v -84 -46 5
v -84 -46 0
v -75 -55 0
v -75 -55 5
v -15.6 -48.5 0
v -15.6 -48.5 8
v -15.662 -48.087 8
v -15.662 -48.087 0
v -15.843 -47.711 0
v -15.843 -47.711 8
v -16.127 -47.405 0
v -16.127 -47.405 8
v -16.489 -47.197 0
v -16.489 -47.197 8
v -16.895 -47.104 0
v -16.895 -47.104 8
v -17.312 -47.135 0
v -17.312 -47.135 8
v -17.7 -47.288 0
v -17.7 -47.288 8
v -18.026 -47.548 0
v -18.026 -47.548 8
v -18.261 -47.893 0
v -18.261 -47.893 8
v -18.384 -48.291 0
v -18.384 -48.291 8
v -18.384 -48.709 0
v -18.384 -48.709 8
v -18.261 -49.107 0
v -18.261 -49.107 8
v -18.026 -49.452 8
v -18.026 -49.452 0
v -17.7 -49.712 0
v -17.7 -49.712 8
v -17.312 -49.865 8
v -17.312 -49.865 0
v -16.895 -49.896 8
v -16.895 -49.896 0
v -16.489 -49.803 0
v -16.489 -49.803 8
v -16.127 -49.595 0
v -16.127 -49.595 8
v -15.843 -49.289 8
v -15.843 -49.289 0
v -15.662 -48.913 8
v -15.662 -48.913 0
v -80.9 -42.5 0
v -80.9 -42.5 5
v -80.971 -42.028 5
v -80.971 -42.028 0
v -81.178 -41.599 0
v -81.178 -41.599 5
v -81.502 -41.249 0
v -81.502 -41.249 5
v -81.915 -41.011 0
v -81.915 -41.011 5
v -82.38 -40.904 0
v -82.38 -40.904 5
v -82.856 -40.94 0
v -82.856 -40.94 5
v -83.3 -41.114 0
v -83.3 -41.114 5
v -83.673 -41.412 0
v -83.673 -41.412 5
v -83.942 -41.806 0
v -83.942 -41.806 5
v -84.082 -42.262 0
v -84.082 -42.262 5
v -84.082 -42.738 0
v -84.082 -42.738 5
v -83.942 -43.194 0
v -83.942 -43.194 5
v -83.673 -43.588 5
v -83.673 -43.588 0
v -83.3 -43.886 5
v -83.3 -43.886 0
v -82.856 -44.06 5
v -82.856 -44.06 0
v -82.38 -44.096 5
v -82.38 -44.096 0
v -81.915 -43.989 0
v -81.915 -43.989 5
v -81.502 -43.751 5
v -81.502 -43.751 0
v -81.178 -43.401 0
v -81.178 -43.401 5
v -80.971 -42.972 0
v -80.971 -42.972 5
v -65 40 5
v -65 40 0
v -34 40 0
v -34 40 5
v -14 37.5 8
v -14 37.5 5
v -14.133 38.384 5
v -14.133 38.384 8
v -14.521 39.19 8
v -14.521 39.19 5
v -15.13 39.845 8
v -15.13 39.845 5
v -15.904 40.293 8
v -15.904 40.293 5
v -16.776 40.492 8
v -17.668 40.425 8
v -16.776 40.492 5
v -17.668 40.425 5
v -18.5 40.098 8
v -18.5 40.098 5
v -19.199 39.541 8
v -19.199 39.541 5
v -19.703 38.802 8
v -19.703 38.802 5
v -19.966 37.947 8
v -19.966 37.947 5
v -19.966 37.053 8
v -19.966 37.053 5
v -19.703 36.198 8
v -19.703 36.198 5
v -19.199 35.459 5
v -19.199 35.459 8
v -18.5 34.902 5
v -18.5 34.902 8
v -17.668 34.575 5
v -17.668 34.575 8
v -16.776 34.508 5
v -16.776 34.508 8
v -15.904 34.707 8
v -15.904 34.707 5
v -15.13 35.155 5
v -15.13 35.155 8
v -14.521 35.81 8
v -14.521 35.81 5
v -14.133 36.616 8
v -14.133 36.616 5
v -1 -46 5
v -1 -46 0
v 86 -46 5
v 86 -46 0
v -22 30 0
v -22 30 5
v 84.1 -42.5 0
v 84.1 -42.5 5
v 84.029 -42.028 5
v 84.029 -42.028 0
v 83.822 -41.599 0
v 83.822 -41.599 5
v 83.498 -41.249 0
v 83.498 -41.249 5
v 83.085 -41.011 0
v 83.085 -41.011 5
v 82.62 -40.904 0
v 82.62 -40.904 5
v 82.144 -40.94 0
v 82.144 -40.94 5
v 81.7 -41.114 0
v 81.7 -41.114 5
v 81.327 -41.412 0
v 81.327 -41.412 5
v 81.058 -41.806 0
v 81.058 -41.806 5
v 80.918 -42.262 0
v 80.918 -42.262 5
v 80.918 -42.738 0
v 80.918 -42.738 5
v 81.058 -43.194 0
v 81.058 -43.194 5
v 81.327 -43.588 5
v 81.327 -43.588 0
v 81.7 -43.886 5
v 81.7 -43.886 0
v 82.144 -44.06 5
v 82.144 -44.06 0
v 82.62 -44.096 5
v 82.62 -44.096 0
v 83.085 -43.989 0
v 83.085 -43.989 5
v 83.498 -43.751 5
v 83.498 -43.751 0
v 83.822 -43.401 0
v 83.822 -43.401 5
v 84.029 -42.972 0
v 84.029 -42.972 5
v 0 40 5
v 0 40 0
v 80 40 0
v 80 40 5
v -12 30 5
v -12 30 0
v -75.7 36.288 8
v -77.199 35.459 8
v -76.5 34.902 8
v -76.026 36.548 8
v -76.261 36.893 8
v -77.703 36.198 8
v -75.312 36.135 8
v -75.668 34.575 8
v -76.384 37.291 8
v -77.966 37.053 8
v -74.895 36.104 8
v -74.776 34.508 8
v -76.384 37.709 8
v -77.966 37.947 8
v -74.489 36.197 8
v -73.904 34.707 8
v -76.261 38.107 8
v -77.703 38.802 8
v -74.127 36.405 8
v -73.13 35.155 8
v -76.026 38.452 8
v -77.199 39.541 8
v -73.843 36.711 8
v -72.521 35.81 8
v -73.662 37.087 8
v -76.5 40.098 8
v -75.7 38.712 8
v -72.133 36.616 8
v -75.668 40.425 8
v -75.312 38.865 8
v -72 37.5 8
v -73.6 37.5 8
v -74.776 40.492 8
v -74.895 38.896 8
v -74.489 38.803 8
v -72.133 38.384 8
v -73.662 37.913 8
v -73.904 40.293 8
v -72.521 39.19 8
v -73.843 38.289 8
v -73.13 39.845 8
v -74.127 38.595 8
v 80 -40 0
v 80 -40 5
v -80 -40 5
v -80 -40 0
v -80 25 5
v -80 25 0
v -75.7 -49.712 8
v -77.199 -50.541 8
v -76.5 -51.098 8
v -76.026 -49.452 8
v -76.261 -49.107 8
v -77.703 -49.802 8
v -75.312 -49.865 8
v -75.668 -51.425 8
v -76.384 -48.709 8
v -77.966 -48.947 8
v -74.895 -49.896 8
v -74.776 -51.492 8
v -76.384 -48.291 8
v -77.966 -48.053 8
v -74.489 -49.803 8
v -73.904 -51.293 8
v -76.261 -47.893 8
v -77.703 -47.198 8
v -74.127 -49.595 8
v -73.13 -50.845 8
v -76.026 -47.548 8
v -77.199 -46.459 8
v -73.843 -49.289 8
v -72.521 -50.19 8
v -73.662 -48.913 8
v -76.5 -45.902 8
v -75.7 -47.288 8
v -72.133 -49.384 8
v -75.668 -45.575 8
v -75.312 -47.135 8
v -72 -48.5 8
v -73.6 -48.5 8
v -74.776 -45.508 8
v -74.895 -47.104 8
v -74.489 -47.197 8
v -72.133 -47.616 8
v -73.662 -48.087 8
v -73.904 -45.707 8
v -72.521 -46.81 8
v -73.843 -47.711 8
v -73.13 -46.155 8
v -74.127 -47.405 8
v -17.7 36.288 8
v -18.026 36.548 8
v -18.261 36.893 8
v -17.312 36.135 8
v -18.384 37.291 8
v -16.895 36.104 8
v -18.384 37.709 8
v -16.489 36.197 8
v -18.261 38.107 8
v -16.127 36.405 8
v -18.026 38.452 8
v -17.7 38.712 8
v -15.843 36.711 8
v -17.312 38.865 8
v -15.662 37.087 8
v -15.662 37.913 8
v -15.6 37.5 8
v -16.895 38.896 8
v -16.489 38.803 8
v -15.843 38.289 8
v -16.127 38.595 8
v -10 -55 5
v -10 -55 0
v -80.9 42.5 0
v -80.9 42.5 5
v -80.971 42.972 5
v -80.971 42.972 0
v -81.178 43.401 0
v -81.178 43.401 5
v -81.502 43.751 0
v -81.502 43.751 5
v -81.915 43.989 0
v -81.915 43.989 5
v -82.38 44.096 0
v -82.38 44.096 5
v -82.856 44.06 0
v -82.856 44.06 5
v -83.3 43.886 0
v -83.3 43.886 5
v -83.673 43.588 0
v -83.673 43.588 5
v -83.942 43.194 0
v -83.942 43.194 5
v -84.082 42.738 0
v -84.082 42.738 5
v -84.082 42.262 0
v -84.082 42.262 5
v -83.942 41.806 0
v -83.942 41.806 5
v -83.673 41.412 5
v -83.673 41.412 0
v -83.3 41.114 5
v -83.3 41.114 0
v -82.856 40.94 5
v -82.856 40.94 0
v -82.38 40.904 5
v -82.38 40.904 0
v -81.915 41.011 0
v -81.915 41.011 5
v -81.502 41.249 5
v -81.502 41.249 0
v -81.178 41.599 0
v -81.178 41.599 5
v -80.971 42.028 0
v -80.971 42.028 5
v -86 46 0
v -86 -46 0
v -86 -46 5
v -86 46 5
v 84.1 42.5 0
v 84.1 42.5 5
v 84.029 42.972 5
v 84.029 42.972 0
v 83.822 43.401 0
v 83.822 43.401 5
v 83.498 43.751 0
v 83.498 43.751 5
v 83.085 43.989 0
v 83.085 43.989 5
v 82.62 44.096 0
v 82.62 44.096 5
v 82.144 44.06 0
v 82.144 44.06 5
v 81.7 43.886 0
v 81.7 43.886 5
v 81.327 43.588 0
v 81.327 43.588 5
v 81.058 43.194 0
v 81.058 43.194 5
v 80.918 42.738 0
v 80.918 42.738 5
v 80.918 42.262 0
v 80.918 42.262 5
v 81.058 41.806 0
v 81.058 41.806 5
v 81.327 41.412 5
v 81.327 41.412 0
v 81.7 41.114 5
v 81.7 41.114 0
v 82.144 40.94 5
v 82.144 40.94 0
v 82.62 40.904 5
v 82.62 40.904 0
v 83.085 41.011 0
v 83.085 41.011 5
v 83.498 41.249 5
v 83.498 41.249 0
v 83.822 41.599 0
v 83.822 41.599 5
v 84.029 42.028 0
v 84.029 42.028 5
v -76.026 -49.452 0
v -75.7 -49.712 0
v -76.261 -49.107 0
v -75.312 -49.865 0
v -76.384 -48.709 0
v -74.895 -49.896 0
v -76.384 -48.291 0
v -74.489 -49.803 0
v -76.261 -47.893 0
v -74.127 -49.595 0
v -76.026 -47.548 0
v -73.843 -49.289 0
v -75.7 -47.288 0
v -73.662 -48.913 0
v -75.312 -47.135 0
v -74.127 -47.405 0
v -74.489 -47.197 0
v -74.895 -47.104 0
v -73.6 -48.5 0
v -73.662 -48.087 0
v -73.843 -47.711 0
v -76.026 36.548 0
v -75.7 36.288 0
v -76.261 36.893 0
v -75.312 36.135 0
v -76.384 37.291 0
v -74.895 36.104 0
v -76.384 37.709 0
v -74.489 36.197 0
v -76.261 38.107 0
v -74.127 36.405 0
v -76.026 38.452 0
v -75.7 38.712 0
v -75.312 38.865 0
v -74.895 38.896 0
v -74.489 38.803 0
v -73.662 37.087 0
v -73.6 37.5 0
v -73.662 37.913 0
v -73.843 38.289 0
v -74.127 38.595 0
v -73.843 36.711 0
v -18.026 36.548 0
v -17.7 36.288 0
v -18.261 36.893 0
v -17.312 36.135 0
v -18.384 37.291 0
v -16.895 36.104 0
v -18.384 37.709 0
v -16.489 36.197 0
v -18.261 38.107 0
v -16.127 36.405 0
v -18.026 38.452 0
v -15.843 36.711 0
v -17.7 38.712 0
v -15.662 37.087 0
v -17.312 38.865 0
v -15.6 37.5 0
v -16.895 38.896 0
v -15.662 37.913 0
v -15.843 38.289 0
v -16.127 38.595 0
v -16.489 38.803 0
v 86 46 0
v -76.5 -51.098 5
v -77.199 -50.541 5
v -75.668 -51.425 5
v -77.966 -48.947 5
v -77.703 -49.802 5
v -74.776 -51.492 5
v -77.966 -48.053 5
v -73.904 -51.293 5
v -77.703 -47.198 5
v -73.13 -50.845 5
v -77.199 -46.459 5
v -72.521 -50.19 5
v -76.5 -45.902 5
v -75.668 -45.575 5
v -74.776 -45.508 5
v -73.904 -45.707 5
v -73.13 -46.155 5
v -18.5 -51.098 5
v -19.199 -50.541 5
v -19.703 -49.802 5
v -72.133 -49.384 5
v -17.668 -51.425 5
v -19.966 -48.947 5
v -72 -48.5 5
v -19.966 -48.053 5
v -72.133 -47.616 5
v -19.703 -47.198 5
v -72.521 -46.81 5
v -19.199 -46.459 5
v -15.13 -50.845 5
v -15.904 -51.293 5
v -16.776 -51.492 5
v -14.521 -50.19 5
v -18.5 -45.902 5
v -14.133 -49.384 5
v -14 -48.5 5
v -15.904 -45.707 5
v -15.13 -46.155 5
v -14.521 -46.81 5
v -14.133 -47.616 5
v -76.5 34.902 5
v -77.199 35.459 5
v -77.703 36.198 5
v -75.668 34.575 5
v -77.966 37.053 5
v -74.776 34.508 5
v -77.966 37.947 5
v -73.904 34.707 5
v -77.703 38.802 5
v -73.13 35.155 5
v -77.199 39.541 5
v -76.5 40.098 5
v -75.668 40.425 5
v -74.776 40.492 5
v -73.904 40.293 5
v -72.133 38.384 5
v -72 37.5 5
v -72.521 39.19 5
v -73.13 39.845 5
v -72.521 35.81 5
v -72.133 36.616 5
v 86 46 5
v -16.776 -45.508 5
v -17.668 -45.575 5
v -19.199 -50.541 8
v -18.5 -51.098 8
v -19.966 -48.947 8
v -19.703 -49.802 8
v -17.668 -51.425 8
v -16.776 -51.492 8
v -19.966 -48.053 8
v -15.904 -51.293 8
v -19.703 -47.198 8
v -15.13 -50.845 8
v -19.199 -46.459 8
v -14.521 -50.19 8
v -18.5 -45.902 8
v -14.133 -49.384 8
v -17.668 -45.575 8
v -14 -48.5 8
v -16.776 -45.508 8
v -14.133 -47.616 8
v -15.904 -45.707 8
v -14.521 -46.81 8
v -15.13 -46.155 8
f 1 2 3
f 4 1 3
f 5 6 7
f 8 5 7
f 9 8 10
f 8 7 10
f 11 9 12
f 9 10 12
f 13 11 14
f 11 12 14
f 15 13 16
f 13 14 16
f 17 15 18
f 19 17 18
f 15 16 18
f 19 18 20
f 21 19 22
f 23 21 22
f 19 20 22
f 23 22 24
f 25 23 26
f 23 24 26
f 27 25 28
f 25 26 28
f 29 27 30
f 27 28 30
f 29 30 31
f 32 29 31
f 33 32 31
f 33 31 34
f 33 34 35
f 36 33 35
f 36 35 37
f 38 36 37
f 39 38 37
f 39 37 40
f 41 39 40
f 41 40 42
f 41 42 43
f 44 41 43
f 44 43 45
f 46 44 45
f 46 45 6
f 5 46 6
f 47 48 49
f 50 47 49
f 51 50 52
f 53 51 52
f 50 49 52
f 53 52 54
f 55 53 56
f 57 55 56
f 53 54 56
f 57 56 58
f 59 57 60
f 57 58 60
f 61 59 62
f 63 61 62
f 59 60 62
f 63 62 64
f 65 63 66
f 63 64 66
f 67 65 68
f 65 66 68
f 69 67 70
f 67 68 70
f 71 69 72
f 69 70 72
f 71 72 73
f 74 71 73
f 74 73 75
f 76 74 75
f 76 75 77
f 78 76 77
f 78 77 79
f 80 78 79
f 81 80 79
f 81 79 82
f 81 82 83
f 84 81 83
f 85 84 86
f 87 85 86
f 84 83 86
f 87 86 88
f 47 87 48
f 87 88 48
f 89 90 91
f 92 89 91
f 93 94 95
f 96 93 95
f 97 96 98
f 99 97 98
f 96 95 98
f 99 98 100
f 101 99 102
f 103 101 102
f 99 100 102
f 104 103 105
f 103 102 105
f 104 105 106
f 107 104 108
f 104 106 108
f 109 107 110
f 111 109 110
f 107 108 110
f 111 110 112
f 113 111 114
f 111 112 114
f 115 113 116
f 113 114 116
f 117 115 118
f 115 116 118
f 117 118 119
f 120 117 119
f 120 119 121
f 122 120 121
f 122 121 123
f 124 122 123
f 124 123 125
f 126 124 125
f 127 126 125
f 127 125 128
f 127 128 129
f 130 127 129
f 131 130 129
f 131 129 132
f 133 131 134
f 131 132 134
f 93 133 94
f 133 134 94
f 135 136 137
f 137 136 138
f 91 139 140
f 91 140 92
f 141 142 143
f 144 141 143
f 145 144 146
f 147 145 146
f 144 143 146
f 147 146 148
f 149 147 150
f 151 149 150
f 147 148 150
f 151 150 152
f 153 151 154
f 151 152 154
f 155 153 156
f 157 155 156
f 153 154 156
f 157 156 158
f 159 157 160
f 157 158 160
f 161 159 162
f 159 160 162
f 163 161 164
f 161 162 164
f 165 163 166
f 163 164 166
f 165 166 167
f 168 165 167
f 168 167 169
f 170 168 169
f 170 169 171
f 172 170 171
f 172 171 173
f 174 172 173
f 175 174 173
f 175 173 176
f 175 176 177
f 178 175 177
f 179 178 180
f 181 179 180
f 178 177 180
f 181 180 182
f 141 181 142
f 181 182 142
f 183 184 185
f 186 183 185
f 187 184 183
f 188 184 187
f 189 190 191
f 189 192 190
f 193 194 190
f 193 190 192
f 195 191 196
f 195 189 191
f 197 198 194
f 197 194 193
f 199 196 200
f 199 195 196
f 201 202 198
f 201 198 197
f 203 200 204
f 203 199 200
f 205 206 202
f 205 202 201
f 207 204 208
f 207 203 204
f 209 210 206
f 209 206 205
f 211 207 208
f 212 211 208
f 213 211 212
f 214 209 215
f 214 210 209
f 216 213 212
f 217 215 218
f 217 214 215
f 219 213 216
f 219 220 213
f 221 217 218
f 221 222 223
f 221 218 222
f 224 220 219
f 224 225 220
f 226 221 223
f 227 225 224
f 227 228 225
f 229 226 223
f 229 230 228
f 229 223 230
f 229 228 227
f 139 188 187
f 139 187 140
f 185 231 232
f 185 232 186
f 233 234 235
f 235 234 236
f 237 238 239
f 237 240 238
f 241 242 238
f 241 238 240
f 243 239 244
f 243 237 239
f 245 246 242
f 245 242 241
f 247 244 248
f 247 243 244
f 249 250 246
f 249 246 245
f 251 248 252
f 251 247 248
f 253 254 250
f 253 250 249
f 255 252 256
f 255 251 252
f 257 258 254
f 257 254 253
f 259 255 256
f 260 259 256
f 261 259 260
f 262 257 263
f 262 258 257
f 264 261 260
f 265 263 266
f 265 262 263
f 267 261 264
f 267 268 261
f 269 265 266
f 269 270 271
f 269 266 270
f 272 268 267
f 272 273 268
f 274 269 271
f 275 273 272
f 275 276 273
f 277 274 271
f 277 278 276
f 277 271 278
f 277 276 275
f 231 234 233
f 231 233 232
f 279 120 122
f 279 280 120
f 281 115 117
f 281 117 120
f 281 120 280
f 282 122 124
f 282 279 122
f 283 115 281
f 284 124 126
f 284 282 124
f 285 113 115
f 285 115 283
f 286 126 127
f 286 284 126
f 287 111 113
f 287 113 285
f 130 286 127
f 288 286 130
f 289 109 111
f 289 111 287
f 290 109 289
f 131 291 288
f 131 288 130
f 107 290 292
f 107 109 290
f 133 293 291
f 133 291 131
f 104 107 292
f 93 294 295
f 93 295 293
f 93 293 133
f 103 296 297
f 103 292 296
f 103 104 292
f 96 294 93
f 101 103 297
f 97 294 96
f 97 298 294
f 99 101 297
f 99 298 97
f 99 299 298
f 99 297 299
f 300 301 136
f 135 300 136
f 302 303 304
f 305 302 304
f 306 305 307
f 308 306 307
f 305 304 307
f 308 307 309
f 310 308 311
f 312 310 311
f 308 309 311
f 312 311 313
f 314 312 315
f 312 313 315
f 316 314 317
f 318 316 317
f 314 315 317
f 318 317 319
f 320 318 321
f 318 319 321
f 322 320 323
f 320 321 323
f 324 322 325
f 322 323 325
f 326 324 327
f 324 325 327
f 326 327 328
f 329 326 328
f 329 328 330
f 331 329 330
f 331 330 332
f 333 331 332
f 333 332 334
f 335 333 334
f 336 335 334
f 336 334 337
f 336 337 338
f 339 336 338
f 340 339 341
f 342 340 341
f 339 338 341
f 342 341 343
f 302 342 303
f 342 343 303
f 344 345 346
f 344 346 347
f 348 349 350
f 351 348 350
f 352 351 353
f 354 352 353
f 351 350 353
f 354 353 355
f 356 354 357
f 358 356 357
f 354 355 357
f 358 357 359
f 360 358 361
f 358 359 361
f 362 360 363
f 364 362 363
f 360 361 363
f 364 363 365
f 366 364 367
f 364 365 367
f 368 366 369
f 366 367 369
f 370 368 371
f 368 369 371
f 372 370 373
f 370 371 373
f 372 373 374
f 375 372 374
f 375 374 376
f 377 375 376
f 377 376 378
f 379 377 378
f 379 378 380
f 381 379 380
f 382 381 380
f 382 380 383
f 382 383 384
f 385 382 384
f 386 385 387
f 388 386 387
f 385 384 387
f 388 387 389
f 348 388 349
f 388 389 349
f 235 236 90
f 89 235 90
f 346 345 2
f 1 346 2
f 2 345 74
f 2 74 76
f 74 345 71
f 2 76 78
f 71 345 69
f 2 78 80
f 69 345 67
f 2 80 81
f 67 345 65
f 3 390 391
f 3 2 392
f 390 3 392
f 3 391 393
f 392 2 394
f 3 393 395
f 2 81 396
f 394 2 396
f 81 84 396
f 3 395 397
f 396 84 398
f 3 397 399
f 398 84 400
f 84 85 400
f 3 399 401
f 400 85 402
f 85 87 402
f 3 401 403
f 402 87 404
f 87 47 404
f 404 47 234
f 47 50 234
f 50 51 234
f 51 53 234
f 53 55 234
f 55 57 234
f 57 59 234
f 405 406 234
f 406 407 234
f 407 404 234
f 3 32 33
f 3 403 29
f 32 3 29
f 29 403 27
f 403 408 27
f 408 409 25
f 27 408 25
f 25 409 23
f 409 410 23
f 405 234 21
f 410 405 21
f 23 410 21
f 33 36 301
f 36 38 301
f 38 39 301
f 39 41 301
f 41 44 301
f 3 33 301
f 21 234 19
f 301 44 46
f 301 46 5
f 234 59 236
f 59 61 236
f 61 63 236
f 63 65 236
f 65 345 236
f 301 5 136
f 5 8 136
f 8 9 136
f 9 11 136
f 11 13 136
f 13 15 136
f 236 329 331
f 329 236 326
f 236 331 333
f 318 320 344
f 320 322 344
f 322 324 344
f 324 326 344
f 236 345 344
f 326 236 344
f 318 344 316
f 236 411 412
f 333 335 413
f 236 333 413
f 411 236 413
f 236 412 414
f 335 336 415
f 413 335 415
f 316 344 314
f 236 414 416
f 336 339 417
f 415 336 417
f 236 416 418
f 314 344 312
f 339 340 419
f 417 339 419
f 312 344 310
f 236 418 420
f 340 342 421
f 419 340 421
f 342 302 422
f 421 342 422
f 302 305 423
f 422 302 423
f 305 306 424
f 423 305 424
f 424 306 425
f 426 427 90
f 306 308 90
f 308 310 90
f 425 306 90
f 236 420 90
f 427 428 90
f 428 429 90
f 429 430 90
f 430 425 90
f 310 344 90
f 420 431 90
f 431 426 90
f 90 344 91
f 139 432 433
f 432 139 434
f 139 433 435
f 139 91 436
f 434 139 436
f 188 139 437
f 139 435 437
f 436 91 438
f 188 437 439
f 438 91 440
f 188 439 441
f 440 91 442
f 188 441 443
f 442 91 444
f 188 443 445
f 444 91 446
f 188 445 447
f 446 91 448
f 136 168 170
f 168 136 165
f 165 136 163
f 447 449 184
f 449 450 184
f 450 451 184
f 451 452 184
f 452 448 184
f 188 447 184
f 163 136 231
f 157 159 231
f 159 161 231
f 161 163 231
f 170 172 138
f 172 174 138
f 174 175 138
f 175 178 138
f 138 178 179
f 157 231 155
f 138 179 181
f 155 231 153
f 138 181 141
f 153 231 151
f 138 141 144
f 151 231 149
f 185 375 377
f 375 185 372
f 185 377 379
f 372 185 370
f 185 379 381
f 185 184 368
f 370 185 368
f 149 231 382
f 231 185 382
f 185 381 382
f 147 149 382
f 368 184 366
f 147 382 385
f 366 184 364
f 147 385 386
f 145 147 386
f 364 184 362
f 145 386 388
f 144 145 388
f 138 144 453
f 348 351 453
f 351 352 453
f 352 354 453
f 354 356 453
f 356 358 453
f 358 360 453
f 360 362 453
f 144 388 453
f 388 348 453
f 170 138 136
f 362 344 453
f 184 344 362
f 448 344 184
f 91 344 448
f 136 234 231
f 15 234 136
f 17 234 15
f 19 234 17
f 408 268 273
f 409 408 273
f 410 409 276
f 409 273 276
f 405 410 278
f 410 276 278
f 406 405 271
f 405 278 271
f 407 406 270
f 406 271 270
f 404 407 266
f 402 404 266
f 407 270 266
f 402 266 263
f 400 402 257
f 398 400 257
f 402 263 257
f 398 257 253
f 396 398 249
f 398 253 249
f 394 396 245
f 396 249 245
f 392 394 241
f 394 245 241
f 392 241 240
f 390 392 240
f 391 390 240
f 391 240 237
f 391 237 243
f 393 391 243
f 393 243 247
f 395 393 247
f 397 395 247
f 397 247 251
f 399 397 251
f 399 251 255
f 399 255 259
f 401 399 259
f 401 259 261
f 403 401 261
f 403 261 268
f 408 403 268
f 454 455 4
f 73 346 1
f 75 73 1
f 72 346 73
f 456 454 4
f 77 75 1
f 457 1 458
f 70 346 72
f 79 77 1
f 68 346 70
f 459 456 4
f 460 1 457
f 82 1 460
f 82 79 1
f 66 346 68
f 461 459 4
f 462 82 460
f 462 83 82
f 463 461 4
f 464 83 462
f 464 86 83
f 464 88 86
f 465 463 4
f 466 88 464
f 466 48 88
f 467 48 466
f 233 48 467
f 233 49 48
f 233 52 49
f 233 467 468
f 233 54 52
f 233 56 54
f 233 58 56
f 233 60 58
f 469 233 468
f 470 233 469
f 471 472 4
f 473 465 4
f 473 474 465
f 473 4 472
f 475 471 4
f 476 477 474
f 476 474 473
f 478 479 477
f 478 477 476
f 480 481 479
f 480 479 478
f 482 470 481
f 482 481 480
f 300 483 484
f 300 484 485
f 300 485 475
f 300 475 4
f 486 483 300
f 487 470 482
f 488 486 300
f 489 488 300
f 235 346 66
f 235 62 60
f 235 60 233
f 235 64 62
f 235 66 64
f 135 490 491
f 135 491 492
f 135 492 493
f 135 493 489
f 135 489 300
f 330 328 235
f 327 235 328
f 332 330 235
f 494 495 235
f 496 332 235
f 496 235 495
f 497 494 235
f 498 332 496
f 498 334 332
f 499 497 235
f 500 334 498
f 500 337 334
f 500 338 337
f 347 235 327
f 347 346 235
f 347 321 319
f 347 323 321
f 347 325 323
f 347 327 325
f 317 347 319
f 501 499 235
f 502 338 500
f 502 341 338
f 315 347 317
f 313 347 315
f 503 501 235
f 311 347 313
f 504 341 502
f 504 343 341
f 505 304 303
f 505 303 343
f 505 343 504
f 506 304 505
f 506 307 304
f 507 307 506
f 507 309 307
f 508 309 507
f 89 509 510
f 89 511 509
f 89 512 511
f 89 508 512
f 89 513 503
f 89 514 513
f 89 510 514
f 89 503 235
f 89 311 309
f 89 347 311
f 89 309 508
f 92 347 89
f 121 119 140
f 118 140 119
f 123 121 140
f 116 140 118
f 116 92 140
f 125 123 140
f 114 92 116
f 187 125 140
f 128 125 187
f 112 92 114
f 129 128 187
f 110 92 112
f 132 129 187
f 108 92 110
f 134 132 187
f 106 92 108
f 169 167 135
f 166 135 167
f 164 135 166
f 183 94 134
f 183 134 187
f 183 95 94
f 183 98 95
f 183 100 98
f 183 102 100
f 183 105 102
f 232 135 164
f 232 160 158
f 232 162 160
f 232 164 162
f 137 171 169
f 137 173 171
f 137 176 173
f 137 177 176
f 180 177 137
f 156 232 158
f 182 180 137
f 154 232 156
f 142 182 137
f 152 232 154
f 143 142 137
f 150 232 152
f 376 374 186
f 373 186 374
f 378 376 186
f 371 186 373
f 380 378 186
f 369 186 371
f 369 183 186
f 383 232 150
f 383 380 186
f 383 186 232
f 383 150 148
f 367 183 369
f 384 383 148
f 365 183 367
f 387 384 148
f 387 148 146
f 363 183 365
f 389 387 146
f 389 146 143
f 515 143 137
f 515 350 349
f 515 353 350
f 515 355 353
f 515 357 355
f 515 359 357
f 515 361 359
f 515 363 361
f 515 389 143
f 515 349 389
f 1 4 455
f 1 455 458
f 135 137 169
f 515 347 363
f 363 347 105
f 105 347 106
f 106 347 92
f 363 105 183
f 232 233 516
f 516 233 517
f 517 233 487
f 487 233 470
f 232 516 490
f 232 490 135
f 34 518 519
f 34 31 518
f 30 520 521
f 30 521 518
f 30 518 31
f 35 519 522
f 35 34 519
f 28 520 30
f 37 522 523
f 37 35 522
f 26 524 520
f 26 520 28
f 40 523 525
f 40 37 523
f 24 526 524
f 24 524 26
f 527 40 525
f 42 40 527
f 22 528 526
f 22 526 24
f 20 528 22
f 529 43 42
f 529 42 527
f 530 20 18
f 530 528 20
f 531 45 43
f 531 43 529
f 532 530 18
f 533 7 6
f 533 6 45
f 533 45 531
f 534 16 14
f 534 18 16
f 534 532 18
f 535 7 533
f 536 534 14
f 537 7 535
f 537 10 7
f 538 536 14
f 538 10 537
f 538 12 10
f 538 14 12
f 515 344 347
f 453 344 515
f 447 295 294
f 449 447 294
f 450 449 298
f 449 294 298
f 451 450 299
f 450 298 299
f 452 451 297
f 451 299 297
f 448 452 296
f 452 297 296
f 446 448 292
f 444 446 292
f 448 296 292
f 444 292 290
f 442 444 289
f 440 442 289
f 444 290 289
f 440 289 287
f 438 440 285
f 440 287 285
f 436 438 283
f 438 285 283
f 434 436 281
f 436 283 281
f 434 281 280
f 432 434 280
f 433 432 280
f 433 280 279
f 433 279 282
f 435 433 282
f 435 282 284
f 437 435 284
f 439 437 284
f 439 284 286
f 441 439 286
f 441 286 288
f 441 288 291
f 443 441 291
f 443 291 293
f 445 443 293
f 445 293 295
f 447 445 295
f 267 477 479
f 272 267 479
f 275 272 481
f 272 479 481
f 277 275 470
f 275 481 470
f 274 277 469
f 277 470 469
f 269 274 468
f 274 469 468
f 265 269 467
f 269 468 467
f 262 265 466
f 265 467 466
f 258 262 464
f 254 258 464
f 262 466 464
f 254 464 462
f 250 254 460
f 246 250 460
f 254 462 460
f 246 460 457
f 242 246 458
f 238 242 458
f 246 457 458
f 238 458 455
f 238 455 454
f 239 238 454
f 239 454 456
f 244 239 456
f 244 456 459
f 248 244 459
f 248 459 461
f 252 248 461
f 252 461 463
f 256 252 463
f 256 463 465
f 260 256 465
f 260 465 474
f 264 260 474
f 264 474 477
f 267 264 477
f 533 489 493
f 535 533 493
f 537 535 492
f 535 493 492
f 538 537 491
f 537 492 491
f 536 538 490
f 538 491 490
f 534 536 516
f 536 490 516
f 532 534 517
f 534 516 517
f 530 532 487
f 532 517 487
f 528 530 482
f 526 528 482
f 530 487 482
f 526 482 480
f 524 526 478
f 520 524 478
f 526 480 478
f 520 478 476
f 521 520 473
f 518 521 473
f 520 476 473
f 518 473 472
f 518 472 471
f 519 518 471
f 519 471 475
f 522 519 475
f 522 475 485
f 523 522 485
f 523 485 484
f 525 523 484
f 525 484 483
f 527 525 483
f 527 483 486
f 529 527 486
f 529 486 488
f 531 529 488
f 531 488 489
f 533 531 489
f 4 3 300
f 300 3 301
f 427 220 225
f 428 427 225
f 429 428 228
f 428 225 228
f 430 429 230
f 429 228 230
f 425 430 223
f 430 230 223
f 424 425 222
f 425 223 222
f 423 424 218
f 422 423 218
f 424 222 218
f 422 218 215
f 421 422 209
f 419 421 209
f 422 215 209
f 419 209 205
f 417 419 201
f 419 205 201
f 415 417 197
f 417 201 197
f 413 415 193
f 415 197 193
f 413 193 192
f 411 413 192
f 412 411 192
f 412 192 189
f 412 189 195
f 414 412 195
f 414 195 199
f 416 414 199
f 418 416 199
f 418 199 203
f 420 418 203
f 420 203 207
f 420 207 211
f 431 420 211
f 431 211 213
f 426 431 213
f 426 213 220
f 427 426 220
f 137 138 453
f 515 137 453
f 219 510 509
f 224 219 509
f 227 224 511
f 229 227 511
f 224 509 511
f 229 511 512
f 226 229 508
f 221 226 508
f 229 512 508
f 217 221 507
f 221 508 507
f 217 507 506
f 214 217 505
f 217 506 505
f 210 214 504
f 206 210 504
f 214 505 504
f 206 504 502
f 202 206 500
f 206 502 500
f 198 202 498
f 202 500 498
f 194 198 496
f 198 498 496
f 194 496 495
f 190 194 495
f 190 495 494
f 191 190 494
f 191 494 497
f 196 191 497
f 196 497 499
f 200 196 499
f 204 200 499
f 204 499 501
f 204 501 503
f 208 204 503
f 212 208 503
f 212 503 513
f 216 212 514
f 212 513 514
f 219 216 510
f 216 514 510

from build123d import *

# Parameters (mm, degrees)
SKETCH_W          = 170
SKETCH_H          = 90
SKETCH_W_2        = 160
SKETCH_H_2        = 80
PAD_DEPTH         = 5
PAD001_DEPTH      = 5
PAD002_DEPTH      = 5
PAD003_DEPTH      = 5
SKETCH004_R       = 1.6
POCKET_DEPTH      = 5
SKETCH005_R       = 3
PAD004_DEPTH      = 3
SKETCH006_R       = 1.4
POCKET001_DEPTH   = 10
COPYSKETCH032_W   = 172
COPYSKETCH032_H   = 92
COPYSKETCH032_W_2 = 170
COPYSKETCH032_H_2 = 90
PAD006_DEPTH      = 5


with BuildPart() as part:
    # Sketch → Pad (new body)
    with BuildSketch(Plane.XY):
        Rectangle(SKETCH_W, SKETCH_H)
        Rectangle(SKETCH_W_2, SKETCH_H_2, mode=Mode.SUBTRACT)
    extrude(amount=PAD_DEPTH)

    # Sketch001 → Pad001 (join)
    with BuildSketch(Plane.XY):
        Polygon((-80, 40), (-80, 25), (-65, 40), align=None)
    extrude(amount=PAD001_DEPTH)

    # Sketch002 → Pad002 (join)
    with BuildSketch(Plane.XY):
        Polygon((-85, -45), (-75, -55), (-10, -55), (0, -45), align=None)
    extrude(amount=PAD002_DEPTH)

    # Sketch003 → Pad003 (join)
    with BuildSketch(Plane.XY):
        Polygon((0, 40), (-12, 30), (-22, 30), (-34, 40), align=None)
    extrude(amount=PAD003_DEPTH)

    # Sketch004 (on Face18 of Pad003) → Pocket (cut)
    with BuildSketch(Plane.XY.offset(5)):
        with Locations((-82.5, 42.5)):
            Circle(SKETCH004_R)
        with Locations((-82.5, -42.5)):
            Circle(SKETCH004_R)
        with Locations((82.5, -42.5)):
            Circle(SKETCH004_R)
        with Locations((82.5, 42.5)):
            Circle(SKETCH004_R)
    extrude(amount=-POCKET_DEPTH, mode=Mode.SUBTRACT)

    # Sketch005 (on Face18 of Pad003) → Pad004 (join)
    with BuildSketch(Plane.XY.offset(5)):
        with Locations((-75, 37.5)):
            Circle(SKETCH005_R)
        with Locations((-17, 37.5)):
            Circle(SKETCH005_R)
        with Locations((-75, -48.5)):
            Circle(SKETCH005_R)
        with Locations((-17, -48.5)):
            Circle(SKETCH005_R)
    extrude(amount=PAD004_DEPTH)

    # Sketch006 (on Face28 of Pad004) → Pocket001 (cut)
    with BuildSketch(Plane.XY.offset(8)):
        with Locations((-75, 37.5)):
            Circle(SKETCH006_R)
        with Locations((-17, 37.5)):
            Circle(SKETCH006_R)
        with Locations((-75, -48.5)):
            Circle(SKETCH006_R)
        with Locations((-17, -48.5)):
            Circle(SKETCH006_R)
    extrude(amount=-POCKET001_DEPTH, mode=Mode.SUBTRACT)

    # CopySketch032 → Pad006 (join)
    with BuildSketch(Plane.XY):
        Rectangle(COPYSKETCH032_W, COPYSKETCH032_H)
        Rectangle(COPYSKETCH032_W_2, COPYSKETCH032_H_2, mode=Mode.SUBTRACT)
    extrude(amount=PAD006_DEPTH)


solid = part.part
